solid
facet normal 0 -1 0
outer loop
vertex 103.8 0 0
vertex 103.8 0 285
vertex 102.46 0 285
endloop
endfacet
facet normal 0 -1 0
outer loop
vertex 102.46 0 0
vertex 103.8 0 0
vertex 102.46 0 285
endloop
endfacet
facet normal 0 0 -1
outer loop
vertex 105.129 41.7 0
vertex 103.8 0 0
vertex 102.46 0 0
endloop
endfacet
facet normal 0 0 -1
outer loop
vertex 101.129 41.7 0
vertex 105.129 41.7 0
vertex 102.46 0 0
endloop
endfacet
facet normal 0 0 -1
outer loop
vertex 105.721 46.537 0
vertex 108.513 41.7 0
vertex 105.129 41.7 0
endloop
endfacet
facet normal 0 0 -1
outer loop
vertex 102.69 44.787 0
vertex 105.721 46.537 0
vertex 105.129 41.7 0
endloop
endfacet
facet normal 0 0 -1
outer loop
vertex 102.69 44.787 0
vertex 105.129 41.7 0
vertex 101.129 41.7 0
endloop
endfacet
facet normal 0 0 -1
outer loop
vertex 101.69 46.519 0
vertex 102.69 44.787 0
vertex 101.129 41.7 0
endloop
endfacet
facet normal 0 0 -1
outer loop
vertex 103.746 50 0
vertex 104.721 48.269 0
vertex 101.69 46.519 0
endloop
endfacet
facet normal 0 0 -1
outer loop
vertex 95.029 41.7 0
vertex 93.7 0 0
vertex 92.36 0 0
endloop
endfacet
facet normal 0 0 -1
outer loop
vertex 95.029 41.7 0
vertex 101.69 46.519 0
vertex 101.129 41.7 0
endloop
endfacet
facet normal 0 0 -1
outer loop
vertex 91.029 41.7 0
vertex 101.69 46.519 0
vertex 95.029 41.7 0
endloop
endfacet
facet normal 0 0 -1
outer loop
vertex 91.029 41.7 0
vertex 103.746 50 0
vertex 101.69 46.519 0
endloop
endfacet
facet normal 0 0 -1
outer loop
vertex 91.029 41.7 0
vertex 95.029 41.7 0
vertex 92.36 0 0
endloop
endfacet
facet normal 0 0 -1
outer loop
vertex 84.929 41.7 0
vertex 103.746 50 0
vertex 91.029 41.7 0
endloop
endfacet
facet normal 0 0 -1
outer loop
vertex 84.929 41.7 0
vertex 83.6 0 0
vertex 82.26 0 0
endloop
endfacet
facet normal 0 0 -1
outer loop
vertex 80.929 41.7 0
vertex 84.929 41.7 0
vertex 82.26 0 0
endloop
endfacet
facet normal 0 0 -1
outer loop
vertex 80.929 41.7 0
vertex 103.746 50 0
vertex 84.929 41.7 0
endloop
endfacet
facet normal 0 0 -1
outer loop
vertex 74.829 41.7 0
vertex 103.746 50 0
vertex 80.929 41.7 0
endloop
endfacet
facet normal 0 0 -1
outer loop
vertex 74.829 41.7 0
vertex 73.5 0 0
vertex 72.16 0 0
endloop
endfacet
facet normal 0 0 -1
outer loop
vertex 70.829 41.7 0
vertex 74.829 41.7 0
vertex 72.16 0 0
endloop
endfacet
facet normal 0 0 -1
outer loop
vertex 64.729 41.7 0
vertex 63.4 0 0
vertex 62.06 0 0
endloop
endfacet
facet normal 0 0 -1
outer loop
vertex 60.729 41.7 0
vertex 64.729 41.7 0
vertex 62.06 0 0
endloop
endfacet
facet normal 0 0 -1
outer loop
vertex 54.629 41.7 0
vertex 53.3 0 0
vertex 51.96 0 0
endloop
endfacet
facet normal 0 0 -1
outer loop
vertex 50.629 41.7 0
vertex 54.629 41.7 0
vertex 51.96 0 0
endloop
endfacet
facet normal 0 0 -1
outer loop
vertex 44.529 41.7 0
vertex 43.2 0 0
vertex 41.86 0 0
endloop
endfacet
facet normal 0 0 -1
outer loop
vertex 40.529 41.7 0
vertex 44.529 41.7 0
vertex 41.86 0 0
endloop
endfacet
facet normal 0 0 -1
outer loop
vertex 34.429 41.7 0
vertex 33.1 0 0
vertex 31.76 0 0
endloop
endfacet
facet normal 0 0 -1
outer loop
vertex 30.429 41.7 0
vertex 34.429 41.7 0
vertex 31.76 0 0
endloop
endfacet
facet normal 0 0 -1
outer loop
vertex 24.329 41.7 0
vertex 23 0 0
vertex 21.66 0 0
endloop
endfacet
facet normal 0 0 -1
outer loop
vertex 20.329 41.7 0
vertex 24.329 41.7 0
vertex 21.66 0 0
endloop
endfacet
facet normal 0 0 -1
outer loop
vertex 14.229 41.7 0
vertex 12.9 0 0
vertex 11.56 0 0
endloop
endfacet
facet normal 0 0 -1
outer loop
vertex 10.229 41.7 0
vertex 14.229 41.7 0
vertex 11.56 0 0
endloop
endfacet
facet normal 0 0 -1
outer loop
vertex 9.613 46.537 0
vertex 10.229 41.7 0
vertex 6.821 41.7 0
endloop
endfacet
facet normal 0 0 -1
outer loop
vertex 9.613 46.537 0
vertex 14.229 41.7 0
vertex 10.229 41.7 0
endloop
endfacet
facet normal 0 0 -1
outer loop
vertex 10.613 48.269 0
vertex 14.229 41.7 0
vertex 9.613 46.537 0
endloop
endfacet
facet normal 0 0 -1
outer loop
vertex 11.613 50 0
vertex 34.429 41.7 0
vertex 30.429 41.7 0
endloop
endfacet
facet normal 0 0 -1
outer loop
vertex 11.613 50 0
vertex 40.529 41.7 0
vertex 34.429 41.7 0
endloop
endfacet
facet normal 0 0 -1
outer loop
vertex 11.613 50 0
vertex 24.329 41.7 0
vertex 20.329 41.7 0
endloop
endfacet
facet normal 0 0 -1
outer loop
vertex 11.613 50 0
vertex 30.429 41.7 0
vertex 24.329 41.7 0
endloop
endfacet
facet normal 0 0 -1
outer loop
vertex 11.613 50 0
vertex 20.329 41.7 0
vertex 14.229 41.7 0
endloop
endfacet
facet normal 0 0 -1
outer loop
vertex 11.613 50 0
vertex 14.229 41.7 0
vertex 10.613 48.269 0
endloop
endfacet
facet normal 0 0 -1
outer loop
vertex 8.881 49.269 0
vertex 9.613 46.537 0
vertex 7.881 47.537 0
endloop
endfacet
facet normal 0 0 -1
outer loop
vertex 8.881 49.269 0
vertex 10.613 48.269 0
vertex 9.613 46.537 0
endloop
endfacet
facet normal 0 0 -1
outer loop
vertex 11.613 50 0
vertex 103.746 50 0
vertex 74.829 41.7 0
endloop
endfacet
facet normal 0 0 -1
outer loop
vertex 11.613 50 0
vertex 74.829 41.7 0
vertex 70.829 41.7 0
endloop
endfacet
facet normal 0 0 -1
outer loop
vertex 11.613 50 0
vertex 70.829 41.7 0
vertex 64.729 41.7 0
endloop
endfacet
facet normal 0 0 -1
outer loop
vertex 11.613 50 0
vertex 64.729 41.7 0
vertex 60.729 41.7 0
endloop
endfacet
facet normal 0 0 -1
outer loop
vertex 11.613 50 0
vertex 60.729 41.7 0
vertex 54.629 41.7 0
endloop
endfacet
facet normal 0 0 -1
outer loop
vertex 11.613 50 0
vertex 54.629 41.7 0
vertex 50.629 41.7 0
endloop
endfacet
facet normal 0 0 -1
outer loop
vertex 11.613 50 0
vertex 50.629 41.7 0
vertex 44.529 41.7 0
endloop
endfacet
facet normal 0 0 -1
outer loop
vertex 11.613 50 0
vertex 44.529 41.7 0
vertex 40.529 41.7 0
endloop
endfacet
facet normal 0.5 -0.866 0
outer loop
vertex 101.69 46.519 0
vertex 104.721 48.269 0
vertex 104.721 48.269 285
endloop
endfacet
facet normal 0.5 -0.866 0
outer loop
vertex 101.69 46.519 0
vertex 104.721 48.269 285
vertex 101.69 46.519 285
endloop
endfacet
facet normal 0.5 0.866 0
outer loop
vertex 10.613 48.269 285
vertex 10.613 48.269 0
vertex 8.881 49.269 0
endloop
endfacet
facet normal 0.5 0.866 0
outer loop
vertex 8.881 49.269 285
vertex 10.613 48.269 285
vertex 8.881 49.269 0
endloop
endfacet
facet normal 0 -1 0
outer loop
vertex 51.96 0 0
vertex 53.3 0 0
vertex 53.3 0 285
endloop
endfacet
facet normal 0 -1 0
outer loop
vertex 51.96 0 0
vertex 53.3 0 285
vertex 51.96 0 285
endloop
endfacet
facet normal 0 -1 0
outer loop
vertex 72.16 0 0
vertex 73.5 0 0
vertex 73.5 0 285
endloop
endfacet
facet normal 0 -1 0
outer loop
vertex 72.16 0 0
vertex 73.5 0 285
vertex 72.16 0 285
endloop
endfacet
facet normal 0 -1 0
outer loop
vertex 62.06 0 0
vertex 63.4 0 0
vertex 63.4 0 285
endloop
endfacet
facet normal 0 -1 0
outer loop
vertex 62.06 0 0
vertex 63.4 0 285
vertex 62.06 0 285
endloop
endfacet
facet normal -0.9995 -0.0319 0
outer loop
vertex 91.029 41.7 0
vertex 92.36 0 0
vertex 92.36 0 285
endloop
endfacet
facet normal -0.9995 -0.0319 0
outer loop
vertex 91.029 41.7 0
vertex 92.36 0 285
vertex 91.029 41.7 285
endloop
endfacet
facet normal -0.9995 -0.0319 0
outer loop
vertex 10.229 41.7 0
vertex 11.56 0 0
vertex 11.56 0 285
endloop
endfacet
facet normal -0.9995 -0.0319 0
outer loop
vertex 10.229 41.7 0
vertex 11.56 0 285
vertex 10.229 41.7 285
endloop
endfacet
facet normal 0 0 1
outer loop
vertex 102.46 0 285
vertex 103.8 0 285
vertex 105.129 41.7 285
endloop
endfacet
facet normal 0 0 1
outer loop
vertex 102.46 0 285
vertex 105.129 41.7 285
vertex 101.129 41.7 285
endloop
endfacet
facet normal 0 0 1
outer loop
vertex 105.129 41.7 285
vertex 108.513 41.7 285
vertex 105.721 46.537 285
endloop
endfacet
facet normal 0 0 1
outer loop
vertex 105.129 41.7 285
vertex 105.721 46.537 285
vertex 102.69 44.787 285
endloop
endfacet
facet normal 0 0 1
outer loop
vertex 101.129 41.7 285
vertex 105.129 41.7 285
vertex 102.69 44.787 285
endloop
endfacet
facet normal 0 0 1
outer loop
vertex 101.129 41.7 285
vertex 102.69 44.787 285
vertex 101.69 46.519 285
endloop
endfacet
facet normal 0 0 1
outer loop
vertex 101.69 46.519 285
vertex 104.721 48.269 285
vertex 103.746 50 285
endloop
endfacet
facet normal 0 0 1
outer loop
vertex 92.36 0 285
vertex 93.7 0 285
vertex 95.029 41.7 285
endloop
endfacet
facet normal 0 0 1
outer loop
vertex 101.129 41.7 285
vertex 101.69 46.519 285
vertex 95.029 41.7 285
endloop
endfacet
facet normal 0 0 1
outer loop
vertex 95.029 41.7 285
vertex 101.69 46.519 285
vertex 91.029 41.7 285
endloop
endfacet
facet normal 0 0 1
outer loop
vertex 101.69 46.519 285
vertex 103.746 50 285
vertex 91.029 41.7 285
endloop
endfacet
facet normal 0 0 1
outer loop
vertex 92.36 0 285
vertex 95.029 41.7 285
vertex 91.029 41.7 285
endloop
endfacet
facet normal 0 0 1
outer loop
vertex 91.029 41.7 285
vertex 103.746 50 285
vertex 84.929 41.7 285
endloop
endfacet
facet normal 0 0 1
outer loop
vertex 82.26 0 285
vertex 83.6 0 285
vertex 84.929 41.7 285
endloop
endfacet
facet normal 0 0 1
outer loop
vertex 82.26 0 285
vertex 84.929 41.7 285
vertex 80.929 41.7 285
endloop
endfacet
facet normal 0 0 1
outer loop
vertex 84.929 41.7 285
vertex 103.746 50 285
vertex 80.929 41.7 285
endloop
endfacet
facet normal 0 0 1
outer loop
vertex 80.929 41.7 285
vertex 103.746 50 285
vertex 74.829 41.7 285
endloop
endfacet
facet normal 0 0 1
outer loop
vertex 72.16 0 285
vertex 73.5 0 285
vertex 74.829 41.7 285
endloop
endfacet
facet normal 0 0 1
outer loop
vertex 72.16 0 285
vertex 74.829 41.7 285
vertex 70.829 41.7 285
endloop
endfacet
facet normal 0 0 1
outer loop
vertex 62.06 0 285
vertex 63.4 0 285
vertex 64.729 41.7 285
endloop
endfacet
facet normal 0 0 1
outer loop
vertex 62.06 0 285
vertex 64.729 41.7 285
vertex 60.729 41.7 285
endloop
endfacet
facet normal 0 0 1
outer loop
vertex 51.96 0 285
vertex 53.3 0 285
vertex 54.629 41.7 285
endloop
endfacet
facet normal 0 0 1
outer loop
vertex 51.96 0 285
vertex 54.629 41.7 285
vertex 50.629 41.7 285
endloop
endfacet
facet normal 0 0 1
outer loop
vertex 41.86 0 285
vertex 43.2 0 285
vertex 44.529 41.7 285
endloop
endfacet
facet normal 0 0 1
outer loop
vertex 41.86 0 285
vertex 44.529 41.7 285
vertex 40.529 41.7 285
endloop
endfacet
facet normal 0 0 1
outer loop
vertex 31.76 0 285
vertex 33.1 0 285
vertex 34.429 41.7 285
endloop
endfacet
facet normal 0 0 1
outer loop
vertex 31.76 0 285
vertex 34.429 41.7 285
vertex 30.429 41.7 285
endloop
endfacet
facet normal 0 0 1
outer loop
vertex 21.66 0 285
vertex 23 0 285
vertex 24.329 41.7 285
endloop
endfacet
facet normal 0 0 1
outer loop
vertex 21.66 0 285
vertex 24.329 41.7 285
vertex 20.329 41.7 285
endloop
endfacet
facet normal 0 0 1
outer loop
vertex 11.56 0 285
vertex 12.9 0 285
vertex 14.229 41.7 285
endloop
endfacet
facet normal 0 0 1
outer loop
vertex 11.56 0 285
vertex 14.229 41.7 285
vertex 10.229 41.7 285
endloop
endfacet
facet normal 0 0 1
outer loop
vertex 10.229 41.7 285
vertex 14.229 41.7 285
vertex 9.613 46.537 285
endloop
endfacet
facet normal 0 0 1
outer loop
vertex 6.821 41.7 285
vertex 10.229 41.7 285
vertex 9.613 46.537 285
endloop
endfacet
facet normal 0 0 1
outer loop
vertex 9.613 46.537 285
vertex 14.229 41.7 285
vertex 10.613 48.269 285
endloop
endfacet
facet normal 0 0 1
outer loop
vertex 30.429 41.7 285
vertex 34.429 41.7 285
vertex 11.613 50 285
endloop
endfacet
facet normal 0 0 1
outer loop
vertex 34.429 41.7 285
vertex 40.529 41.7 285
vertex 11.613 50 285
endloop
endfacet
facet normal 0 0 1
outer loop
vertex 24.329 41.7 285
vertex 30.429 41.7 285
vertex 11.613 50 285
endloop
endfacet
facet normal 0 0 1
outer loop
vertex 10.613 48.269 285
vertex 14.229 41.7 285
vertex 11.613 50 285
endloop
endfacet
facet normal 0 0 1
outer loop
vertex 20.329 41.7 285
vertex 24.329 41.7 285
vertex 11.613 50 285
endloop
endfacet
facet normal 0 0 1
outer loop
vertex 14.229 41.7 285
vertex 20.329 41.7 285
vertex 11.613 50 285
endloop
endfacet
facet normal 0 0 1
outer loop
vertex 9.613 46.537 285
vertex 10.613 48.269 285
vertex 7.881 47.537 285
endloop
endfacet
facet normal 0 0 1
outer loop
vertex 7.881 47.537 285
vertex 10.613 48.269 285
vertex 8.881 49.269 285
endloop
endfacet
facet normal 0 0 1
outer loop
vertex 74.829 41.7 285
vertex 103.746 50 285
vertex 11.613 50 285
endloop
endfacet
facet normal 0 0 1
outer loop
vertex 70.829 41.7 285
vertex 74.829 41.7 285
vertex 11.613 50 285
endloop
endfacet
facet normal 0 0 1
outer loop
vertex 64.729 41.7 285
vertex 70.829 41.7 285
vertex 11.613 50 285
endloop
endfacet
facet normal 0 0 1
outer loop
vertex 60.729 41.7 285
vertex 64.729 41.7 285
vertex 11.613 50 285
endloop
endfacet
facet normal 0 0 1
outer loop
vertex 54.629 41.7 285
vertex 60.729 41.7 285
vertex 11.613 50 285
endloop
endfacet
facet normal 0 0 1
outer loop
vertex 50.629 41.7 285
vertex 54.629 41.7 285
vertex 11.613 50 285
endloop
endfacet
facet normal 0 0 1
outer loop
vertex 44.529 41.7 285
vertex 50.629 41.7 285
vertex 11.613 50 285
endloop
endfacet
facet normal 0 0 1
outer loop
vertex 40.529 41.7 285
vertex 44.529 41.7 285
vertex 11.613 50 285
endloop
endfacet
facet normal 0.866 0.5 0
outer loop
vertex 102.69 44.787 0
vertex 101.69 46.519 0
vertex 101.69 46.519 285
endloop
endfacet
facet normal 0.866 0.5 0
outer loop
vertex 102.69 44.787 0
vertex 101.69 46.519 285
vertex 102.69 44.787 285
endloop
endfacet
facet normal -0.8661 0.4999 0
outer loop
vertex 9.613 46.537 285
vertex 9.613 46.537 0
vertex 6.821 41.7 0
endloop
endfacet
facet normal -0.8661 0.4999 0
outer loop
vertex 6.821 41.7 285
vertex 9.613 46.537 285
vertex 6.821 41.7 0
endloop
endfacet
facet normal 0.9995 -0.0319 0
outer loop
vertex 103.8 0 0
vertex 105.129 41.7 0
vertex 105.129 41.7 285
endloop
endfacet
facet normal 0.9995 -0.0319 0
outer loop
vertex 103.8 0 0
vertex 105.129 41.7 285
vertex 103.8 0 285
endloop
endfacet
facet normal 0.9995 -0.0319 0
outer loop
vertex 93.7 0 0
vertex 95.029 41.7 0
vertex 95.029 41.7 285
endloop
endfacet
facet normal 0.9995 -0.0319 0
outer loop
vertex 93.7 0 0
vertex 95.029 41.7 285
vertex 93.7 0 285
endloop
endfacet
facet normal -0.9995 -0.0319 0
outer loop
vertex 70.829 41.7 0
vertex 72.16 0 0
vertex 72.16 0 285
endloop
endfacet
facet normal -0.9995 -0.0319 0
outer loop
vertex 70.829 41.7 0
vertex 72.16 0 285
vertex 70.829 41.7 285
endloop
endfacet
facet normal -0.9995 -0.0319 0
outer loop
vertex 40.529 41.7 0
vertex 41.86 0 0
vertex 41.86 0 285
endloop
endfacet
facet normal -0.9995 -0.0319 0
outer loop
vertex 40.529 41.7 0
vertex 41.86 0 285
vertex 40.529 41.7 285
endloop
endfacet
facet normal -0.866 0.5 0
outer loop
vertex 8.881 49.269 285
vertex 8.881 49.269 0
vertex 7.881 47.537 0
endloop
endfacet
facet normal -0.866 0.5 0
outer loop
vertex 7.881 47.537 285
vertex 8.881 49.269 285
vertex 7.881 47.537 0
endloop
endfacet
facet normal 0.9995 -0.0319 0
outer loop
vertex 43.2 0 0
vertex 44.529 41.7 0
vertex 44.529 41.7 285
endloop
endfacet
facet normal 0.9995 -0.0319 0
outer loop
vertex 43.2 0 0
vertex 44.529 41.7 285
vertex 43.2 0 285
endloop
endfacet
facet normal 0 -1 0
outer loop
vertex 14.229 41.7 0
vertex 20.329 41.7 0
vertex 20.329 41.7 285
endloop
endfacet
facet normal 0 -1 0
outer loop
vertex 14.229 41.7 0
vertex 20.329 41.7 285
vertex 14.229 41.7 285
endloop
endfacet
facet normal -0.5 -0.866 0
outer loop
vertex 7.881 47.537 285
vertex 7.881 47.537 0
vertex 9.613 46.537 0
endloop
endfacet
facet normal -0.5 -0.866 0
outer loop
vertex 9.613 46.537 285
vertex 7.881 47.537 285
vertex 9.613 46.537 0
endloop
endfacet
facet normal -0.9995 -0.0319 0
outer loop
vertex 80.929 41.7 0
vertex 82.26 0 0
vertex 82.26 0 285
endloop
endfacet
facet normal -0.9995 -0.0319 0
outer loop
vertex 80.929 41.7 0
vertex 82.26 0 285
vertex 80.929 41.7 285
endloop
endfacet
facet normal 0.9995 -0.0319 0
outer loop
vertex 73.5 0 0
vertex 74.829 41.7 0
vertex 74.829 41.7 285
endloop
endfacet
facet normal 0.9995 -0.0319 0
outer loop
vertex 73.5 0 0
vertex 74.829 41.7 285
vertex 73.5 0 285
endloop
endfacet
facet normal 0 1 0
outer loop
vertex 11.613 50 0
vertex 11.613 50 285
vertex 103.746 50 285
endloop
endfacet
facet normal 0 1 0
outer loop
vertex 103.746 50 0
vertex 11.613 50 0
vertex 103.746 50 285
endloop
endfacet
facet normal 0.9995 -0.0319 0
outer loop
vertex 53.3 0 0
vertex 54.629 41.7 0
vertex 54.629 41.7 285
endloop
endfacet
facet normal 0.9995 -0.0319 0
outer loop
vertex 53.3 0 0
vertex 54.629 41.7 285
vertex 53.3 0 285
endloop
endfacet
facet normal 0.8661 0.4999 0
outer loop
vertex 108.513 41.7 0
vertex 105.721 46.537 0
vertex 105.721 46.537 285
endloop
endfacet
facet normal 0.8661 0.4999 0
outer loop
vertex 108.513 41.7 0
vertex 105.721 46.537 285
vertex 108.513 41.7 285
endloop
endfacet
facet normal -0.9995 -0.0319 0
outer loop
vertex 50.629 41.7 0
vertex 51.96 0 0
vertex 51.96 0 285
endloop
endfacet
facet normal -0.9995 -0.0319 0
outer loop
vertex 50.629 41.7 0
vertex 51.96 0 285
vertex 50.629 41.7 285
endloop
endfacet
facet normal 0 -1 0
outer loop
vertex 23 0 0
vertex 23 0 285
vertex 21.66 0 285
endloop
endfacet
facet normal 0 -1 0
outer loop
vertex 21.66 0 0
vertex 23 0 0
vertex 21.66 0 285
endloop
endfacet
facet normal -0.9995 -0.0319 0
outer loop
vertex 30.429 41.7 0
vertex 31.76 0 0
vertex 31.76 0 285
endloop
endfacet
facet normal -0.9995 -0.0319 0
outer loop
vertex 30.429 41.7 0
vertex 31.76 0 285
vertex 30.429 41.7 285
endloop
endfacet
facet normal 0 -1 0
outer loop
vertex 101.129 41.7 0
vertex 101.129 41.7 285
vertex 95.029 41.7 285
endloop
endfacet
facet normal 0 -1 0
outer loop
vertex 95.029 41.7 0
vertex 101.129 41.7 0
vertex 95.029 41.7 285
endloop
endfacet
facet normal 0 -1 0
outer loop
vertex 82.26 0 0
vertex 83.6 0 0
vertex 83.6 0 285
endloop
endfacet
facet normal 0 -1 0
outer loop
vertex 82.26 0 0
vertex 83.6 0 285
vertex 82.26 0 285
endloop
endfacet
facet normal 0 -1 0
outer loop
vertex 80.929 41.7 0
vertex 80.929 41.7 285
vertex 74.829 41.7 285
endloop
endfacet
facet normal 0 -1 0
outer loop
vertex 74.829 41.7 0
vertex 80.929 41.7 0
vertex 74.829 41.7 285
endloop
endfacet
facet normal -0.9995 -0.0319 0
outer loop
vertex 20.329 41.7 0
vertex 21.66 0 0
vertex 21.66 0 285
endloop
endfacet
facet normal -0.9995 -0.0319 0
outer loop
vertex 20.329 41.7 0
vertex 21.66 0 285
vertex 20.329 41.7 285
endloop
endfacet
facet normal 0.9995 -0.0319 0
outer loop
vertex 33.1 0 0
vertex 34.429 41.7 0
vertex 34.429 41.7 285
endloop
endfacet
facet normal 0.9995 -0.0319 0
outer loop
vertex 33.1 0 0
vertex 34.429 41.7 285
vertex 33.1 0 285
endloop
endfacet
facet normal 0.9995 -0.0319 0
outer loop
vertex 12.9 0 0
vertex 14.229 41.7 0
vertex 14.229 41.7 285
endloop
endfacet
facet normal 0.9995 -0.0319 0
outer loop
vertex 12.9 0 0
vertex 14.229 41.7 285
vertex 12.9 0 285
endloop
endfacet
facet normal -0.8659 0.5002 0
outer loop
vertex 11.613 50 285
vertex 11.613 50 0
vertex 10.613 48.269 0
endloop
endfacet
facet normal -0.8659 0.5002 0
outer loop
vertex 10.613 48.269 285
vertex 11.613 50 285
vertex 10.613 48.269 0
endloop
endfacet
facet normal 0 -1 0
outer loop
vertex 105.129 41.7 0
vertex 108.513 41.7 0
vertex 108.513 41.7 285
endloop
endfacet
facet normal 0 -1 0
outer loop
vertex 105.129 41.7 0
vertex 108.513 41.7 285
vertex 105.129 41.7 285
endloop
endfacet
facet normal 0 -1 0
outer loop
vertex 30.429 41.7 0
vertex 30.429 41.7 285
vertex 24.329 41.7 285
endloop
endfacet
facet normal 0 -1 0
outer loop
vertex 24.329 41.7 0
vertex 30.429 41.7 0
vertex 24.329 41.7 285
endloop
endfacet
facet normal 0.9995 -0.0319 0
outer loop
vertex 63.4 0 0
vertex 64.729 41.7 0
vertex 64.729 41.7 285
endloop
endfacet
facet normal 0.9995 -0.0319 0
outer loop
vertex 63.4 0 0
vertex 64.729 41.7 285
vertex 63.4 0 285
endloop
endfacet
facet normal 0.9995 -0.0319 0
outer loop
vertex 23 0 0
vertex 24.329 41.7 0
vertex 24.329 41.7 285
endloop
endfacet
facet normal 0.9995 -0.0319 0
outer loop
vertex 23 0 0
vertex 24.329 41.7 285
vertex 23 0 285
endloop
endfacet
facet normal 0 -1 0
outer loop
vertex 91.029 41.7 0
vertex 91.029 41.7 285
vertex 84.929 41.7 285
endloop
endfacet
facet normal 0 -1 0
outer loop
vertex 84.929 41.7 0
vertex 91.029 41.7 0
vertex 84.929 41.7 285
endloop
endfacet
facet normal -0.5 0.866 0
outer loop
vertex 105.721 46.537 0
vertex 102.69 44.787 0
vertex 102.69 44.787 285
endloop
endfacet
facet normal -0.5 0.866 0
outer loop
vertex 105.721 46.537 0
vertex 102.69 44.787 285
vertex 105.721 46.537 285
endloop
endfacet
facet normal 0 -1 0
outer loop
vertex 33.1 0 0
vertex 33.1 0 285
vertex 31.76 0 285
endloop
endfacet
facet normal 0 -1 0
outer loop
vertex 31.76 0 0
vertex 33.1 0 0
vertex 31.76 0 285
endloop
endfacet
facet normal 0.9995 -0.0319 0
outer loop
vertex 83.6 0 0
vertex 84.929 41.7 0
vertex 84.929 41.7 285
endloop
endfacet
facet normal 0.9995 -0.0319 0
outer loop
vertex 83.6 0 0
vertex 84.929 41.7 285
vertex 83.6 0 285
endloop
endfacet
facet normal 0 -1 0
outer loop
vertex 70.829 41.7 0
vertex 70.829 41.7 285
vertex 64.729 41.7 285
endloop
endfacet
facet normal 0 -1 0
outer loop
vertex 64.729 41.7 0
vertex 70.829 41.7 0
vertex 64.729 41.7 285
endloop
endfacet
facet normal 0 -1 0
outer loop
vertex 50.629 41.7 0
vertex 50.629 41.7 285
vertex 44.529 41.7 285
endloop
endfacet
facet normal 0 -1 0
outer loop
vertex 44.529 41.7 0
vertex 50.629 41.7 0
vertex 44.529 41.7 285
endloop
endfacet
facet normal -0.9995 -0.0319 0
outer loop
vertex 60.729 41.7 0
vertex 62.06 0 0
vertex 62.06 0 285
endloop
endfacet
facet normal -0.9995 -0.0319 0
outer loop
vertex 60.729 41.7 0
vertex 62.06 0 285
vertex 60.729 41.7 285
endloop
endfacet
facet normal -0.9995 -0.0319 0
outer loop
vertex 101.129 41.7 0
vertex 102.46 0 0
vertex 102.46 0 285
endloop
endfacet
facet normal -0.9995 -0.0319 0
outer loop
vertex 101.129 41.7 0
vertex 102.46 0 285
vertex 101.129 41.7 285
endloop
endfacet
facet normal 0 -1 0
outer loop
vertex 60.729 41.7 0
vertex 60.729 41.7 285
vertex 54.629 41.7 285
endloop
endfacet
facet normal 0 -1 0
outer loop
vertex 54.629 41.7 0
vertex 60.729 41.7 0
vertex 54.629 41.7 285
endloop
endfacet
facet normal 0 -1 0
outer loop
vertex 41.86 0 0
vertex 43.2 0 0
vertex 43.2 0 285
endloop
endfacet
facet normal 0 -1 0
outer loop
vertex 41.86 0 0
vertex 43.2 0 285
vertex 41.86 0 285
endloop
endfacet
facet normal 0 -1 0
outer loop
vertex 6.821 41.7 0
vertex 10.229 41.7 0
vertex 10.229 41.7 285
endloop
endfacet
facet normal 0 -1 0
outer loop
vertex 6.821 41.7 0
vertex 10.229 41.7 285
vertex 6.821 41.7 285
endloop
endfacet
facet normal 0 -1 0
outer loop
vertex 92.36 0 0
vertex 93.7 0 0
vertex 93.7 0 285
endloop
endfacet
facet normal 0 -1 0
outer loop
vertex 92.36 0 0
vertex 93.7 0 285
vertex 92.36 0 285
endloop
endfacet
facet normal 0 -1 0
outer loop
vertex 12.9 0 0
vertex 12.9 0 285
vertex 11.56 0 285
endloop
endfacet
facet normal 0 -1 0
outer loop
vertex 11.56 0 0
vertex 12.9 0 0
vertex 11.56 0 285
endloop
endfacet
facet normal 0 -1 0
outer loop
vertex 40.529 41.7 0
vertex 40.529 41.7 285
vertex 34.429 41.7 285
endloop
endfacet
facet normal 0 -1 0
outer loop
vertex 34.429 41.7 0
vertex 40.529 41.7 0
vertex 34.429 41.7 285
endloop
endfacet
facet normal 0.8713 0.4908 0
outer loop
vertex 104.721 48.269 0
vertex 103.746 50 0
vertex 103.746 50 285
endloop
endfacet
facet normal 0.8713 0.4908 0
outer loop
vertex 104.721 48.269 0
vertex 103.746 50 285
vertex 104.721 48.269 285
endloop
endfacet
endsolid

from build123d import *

# Parameters (mm, degrees)
RESSALTO_EXTRUS_O1_DEPTH   = 285
CORTE_EXTRUS_O1_DEPTH      = 1
CORTE_EXTRUS_O1_DEPTH_BACK = 286


with BuildPart() as part:
    # Esboço1 → Ressalto-extrusão1 (new body)
    with BuildSketch(Plane.XY):
        Polygon((0.129363371, 0.000429576), (0.129363371, 50.000429576), (115.229363371, 50.000429576), (115.229363371, 0.000429576), (112.558897843, 0.0275034), (111.229363371, 41.700429576), (105.129363371, 41.700429576), (103.799966135, 0.000429576), (102.459761608, 0.000429576), (101.129363371, 41.700429576), (95.029363371, 41.700429576), (93.699966135, 0.000429576), (92.359761608, 0.000429576), (91.029363371, 41.700429576), (84.929363371, 41.700429576), (83.599966135, 0.000429576), (82.259761608, 0.000429576), (80.929363371, 41.700429576), (74.829363371, 41.700429576), (73.499966135, 0.000429576), (72.159761608, 0.000429576), (70.829363371, 41.700429576), (64.729363371, 41.700429576), (63.399966135, 0.000429576), (62.059761608, 0.000429576), (60.729363371, 41.700429576), (54.629363371, 41.700429576), (53.299966135, 0.000429576), (51.959761608, 0.000429576), (50.629363371, 41.700429576), (44.529363371, 41.700429576), (43.199966135, 0.000429576), (41.859761608, 0.000429576), (40.529363371, 41.700429576), (34.429363371, 41.700429576), (33.099966135, 0.000429576), (31.759761608, 0.000429576), (30.429363371, 41.700429576), (24.329363371, 41.700429576), (22.999966135, 0.000429576), (21.659761608, 0.000429576), (20.329363371, 41.700429576), (14.229363371, 41.700429576), (12.899966135, 0.000429576), (11.559761608, 0.000429576), (10.229363371, 41.700429576), (4.129363371, 41.700429576), (2.799966135, 0.000429576), align=None)
    extrude(amount=RESSALTO_EXTRUS_O1_DEPTH)

    # Esboço2 → Corte-extrusão1 (cut, two sides)
    with BuildSketch(Plane(origin=(0, 0, 0), x_dir=(-1, 0, 0), z_dir=(0, 0, -1))) as corte_extrus_o1_sk:
        Polygon((-104.72087071, 48.268772175), (-101.689781797, 46.518772175), (-102.689781797, 44.786721368), (-105.72087071, 46.536721368), (-108.513105078, 41.700429576), (-108.513105078, 0.000429576), (-115.229363371, 0.000429576), (-115.229363371, 50.000429576), (-103.74577832, 50.000429576), align=None)
        Polygon((-10.613175555, 48.268772175), (-8.881124748, 49.268772175), (-7.881124748, 47.536721368), (-9.613175555, 46.536721368), (-6.820941187, 41.700429576), (-6.820941187, 0), (0, 0), (-0.129363371, 50.000429576), (-11.612948422, 50.000429576), align=None)
    extrude(amount=CORTE_EXTRUS_O1_DEPTH, mode=Mode.SUBTRACT)
    extrude(corte_extrus_o1_sk.sketch, amount=-CORTE_EXTRUS_O1_DEPTH_BACK, mode=Mode.SUBTRACT)


solid = part.part
